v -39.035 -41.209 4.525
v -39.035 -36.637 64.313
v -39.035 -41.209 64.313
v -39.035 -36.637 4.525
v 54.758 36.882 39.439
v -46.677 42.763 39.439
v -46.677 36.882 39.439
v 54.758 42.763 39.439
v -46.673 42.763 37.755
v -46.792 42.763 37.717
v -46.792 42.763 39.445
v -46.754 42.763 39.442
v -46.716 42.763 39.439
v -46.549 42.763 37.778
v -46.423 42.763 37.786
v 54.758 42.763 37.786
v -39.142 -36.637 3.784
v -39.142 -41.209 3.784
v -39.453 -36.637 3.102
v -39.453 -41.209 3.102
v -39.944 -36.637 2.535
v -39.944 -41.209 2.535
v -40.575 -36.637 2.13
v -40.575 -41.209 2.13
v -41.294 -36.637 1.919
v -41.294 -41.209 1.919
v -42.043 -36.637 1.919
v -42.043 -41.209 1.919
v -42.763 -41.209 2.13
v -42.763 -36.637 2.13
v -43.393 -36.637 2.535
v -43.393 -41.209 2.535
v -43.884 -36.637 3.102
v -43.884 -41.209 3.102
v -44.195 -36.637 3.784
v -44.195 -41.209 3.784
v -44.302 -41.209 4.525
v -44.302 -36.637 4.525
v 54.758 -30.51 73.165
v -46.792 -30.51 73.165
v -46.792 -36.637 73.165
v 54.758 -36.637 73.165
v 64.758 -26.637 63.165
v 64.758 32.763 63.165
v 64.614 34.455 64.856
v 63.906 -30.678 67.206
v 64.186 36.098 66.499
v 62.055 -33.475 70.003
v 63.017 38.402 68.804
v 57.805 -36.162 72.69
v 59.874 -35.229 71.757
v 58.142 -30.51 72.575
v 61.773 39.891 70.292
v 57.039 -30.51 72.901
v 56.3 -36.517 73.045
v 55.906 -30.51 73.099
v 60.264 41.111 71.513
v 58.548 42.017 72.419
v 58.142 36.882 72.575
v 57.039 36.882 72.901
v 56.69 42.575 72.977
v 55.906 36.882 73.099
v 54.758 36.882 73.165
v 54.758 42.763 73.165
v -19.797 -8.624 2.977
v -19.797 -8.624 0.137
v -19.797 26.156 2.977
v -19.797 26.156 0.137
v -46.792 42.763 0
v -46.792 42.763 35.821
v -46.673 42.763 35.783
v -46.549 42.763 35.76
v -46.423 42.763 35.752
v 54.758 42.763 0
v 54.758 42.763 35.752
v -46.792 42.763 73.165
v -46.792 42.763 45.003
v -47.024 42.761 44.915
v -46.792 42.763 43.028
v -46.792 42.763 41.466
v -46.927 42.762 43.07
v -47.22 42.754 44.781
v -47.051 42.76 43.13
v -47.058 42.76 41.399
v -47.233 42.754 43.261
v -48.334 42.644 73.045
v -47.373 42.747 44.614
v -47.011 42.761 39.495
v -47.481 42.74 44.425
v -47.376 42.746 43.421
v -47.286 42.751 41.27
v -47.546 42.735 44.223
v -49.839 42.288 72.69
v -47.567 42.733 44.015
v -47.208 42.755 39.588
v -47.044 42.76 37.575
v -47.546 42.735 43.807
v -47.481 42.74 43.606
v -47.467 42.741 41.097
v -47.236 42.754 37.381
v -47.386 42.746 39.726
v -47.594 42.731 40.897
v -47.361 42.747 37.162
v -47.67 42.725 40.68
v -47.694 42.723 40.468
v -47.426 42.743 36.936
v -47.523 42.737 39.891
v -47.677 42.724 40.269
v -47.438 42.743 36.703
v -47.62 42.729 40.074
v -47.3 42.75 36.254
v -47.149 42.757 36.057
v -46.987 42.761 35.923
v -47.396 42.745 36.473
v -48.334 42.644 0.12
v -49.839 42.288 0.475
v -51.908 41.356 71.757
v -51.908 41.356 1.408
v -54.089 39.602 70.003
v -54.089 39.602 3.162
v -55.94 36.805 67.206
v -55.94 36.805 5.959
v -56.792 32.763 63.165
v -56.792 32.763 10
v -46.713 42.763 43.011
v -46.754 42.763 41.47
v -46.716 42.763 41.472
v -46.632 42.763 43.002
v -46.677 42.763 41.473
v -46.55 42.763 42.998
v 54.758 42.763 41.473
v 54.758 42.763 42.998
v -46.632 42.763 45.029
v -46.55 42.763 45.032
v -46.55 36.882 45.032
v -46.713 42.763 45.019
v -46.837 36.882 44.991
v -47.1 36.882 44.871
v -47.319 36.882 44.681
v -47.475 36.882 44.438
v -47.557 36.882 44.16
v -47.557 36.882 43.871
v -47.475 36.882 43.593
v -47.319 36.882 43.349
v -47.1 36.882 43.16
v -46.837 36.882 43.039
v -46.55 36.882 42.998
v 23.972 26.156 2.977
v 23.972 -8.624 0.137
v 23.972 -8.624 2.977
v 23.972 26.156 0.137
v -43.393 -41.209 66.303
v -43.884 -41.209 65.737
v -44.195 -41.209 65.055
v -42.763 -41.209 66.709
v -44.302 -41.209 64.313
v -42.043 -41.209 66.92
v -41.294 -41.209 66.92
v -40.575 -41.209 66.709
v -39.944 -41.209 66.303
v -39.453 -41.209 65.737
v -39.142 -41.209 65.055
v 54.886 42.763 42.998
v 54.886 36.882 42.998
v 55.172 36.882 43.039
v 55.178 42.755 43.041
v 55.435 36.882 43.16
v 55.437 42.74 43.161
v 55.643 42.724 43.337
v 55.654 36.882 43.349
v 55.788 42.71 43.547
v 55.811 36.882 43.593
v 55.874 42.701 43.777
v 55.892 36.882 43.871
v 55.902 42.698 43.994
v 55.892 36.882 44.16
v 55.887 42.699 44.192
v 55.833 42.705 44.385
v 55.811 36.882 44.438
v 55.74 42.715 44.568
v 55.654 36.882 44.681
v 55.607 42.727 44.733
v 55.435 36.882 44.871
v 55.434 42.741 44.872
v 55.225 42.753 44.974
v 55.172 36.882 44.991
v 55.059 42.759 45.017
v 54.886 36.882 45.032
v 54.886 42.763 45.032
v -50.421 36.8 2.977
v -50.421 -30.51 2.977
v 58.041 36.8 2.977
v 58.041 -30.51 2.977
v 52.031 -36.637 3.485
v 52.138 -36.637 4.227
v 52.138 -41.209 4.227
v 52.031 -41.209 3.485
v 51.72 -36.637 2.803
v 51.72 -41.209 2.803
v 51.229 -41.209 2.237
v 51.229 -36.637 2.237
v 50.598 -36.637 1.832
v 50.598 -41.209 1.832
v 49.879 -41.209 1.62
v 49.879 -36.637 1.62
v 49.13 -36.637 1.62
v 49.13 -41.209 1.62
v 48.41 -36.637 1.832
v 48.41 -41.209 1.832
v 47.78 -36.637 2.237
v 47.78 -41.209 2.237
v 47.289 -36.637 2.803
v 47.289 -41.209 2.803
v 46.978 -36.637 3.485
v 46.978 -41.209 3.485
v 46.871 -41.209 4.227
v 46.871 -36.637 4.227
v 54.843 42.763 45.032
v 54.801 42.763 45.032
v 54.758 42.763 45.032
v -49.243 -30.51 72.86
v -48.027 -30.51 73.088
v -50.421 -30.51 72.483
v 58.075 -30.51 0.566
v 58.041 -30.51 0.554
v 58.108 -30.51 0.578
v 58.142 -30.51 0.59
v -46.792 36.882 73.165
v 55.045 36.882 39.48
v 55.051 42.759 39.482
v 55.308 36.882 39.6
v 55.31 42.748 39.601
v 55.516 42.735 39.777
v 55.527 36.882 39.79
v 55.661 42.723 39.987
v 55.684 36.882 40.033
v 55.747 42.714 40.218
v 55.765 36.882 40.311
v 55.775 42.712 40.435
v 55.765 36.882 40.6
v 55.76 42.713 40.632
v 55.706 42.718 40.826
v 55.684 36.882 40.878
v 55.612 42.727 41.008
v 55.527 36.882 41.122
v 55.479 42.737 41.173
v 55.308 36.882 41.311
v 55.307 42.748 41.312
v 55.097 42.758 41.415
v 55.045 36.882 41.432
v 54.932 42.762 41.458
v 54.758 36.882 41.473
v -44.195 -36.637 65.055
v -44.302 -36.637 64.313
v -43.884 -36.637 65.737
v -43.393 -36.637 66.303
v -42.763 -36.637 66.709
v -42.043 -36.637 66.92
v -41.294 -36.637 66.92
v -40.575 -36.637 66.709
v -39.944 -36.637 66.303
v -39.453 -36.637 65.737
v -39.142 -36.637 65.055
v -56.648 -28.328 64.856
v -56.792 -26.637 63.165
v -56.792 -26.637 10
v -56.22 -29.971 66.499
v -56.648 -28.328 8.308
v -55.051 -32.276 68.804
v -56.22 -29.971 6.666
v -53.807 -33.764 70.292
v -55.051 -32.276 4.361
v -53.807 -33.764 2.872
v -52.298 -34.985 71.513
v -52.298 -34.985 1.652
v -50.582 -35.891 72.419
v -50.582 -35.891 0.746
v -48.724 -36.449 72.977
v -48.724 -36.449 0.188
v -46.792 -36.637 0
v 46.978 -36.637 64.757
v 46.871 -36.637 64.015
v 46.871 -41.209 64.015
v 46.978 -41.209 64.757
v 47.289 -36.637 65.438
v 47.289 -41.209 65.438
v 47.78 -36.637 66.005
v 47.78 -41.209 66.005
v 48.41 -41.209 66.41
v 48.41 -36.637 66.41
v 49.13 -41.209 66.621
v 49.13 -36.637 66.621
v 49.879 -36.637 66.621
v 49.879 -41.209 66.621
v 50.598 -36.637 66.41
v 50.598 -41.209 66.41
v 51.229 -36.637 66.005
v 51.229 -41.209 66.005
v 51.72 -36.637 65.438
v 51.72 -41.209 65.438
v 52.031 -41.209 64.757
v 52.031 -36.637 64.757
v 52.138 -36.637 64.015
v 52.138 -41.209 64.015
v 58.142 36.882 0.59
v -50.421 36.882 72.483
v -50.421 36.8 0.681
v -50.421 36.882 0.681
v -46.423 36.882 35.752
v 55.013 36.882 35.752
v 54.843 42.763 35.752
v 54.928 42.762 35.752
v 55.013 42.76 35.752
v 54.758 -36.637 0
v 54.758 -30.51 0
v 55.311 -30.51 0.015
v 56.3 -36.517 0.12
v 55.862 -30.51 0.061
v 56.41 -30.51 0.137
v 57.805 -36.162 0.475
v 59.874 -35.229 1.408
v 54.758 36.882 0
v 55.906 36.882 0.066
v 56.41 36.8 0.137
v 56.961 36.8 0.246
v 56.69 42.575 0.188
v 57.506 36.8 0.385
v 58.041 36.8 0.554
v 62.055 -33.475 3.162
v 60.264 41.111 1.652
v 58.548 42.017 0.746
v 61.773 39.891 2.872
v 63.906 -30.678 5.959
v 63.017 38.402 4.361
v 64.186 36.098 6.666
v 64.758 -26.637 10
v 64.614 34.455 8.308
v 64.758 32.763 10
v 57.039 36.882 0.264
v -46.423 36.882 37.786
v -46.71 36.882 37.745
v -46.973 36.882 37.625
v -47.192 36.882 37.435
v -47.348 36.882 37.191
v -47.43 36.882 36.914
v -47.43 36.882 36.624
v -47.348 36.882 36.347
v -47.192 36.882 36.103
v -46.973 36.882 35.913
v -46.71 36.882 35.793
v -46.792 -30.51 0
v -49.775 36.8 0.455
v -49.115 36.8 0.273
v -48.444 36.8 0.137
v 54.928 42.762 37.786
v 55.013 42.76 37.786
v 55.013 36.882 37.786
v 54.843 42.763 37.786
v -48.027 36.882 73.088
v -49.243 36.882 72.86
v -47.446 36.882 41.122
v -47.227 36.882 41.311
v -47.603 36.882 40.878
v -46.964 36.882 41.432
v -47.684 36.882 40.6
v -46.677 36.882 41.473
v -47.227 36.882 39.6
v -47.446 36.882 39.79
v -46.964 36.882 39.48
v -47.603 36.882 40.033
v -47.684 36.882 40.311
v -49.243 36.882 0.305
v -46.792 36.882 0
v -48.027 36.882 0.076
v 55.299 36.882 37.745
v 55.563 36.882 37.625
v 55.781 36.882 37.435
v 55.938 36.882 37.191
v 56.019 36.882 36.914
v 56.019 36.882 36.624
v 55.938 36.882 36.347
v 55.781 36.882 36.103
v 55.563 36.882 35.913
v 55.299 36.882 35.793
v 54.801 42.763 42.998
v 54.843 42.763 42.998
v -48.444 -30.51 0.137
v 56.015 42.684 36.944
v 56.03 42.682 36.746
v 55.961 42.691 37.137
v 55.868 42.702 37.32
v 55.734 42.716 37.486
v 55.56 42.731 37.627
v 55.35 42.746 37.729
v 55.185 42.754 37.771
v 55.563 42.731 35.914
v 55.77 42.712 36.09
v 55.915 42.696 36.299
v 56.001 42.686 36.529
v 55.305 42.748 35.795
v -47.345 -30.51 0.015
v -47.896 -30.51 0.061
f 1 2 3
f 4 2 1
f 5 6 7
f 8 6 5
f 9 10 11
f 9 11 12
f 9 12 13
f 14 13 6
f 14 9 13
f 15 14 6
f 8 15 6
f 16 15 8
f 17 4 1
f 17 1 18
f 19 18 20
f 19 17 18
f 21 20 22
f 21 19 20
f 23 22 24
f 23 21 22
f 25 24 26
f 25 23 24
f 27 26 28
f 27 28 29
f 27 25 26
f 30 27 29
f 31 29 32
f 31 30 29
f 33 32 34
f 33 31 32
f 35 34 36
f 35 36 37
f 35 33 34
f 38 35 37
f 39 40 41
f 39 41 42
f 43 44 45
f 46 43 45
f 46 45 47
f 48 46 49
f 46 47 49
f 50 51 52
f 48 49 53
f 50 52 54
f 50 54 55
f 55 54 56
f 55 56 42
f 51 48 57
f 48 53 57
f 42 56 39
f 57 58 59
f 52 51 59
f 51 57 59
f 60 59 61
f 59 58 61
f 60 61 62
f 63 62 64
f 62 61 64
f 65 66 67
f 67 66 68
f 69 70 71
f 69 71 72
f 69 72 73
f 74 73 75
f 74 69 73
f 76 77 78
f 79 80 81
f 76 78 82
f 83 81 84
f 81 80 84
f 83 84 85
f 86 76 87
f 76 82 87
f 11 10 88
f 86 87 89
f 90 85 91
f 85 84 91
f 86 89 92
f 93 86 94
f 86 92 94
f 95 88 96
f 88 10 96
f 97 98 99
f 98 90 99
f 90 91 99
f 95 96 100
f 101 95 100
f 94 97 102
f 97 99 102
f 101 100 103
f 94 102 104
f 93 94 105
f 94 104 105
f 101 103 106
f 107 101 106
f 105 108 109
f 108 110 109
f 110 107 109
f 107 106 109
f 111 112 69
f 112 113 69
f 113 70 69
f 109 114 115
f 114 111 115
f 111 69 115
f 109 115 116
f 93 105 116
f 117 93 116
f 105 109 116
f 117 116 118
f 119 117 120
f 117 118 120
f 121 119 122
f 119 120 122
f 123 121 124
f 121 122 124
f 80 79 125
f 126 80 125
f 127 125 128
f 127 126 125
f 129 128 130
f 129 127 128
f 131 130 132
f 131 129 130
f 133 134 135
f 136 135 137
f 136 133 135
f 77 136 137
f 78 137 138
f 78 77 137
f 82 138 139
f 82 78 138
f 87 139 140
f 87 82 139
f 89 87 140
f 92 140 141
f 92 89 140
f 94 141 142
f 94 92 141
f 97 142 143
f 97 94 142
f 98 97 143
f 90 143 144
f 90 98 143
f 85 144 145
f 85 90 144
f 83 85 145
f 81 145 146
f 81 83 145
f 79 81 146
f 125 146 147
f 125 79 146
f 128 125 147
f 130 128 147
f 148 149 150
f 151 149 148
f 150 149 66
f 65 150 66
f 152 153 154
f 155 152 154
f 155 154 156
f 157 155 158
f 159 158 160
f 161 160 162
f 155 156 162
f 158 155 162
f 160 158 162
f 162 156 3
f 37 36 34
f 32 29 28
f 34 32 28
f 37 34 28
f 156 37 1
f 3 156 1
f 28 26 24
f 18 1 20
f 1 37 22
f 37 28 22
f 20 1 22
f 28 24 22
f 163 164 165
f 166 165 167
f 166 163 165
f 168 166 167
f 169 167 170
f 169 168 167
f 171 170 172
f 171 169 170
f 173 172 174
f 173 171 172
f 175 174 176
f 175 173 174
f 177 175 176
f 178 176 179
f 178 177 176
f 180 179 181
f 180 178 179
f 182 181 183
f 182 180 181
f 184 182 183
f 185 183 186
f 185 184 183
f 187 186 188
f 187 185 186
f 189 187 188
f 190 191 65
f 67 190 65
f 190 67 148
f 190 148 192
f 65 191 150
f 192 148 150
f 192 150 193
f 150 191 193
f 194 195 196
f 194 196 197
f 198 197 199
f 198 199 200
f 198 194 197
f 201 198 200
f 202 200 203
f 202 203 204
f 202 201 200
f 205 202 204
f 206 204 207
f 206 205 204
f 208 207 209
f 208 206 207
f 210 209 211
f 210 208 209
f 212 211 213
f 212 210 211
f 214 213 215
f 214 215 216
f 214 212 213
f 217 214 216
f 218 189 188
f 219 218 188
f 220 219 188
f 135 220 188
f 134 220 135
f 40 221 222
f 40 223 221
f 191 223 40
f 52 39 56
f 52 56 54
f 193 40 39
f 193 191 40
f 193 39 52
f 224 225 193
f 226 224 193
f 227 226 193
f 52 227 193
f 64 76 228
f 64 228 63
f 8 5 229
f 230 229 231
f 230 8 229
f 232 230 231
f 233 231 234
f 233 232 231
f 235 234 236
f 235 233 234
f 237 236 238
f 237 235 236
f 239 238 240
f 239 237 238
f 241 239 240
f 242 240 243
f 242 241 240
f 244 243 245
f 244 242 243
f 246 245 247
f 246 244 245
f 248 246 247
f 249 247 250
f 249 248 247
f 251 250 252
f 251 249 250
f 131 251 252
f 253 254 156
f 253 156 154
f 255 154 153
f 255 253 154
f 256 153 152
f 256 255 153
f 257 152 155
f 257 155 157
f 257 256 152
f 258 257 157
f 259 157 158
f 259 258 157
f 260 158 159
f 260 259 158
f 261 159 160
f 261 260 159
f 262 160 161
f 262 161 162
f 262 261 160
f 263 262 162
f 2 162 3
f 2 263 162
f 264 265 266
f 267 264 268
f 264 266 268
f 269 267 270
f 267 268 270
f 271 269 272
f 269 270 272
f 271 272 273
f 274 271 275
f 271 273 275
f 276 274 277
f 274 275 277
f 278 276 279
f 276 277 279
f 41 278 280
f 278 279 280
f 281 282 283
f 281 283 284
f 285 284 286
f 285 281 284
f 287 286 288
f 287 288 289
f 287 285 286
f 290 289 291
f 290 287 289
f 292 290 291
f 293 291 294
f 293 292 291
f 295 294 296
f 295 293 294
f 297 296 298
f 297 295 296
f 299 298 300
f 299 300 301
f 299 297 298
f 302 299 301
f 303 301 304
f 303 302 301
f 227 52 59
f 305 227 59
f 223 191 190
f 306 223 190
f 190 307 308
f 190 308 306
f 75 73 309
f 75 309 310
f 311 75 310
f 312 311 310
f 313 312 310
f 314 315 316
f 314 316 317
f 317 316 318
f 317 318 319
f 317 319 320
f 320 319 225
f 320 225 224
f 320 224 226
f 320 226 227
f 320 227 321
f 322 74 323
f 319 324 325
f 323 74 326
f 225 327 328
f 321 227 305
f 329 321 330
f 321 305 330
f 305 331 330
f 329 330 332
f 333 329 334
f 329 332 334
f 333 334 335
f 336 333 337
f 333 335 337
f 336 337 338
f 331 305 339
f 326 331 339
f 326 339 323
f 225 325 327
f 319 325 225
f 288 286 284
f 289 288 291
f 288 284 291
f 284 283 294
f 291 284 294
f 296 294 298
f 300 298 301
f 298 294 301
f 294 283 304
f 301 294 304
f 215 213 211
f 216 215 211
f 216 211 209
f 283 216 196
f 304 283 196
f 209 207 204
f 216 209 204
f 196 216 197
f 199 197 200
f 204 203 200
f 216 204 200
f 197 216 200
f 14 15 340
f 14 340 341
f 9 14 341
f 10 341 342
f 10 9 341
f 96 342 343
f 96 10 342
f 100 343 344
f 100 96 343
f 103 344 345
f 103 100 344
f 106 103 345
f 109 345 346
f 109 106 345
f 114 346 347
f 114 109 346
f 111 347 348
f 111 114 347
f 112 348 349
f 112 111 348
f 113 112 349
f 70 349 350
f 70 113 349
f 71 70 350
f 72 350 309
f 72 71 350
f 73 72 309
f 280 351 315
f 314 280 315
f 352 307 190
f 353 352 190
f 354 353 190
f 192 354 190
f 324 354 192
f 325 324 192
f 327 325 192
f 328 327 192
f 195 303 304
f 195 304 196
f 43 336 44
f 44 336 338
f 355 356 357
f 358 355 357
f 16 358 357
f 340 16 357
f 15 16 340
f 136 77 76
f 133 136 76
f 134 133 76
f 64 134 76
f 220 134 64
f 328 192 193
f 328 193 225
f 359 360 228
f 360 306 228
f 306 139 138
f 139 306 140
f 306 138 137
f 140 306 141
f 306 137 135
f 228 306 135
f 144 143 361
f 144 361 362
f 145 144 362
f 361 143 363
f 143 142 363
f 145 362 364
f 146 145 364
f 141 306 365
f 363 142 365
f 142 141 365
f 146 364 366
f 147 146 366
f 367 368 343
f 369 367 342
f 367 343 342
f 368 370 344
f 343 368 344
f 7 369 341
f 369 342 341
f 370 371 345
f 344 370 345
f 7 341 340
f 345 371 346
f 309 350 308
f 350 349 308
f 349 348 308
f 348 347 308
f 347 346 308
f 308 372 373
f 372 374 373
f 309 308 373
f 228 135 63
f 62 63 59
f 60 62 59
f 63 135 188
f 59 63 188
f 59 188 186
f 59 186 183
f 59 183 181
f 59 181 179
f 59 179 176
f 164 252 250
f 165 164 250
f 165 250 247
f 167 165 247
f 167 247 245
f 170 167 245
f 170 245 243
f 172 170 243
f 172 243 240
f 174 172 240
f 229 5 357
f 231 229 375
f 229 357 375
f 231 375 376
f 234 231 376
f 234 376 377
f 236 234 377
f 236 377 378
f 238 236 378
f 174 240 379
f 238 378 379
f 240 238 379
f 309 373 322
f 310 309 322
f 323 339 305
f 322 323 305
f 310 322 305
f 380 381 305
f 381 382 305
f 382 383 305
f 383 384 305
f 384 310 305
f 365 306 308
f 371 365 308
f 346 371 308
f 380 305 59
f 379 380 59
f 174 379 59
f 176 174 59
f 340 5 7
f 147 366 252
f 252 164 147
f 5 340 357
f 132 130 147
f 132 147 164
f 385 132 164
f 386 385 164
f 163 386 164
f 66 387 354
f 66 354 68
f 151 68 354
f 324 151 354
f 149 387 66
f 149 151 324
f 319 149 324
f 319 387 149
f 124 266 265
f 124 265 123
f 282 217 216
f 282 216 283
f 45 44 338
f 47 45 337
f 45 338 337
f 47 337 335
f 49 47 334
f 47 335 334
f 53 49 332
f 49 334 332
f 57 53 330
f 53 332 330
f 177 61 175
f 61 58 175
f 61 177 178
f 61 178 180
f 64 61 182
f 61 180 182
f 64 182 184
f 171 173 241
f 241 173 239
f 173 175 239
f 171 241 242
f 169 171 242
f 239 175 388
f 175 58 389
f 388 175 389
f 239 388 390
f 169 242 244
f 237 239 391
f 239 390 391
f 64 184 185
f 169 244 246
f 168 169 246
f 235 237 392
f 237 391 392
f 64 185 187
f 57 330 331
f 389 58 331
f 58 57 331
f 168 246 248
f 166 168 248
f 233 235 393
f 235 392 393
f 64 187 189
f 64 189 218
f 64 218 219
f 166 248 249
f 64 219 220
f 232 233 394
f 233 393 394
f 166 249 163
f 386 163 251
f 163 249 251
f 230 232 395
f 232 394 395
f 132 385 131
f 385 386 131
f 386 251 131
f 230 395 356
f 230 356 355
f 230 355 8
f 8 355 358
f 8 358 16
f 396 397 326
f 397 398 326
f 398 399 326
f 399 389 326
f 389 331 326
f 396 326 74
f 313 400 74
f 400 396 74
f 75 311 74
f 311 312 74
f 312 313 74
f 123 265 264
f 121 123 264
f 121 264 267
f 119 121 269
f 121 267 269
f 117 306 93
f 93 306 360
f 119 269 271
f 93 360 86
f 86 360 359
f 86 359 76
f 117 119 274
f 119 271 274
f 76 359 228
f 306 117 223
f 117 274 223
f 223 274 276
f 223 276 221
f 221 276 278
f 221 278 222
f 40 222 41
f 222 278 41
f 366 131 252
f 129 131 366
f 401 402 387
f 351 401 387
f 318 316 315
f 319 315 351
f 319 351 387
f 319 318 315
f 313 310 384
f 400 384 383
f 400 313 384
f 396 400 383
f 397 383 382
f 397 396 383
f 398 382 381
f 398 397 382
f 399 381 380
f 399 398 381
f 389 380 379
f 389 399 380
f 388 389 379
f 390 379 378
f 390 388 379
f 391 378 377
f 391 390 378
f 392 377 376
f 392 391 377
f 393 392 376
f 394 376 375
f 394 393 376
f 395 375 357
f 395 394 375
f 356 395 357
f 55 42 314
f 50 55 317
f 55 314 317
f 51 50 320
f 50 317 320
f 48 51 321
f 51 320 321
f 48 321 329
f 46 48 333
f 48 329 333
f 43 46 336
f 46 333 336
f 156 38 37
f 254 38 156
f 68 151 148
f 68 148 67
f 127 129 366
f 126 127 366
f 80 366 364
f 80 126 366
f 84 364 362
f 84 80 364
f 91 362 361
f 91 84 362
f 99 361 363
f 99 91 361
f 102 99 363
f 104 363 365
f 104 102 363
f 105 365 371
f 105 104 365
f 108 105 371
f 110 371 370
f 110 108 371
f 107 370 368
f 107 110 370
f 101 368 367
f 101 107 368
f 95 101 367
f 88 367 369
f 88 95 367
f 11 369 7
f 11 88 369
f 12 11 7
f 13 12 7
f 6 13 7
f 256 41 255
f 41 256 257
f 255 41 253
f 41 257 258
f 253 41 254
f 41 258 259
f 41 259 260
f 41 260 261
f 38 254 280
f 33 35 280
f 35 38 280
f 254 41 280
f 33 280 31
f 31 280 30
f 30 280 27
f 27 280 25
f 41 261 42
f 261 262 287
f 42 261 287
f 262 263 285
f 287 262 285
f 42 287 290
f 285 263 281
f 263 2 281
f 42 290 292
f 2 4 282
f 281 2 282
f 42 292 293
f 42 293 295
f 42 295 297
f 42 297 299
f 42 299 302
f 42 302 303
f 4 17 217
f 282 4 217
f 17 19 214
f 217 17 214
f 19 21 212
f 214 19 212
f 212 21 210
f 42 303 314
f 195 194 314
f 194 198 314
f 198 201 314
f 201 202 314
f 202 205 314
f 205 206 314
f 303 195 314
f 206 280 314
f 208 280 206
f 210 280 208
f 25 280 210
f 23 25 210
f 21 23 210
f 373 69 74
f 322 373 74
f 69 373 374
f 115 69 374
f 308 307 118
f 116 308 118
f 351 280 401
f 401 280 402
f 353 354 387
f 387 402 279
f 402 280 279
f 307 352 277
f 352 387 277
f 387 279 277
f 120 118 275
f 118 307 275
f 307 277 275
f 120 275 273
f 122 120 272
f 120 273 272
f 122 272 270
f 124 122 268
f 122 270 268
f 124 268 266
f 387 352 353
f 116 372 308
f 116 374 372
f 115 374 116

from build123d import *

# Parameters (mm, degrees)
IZIM1_W                     = 121.550964813
IZIM1_H                     = 79.400227015
IZIM1_W_2                   = 108.562656073
IZIM1_H_2                   = 67.392167991
Y_KSEKLIK_EKSTR_ZYON1_DEPTH = 73.164910278
IZIM2_W                     = 108.665778405
IZIM2_H                     = 2.839609685
Y_KSEKLIK_EKSTR_ZYON3_DEPTH = 67.31
IZIM4_W                     = 43.769026383
IZIM4_H                     = 34.779664875
KES_EKSTR_ZYON3_DEPTH       = 51.308
RADYUS1_R                   = 10
RADYUS2_R                   = 10
KES_EKSTR_ZYON6_DEPTH       = 25.4
Y_KSEKLIK_EKSTR_ZYON4_DEPTH = 4.572


with BuildPart() as part:
    # Çizim1 → Yükseklik-Ekstrüzyon1 (new body)
    with BuildSketch(Plane.XY):
        with Locations((3.983010787, 3.063280364)):
            Rectangle(IZIM1_W, IZIM1_H)
        with Locations((3.860479571, 3.185811577)):
            Rectangle(IZIM1_W_2, IZIM1_H_2, mode=Mode.SUBTRACT)
    extrude(amount=Y_KSEKLIK_EKSTR_ZYON1_DEPTH)

    # Çizim2 → Yükseklik-Ekstrüzyon3 (add)
    with BuildSketch(Plane(origin=(0, -30.510272418, 0), x_dir=(1, 0, 0), z_dir=(0, 1, 0))):
        with Locations((3.70835341, -1.557090266)):
            Rectangle(IZIM2_W, IZIM2_H)
    extrude(amount=Y_KSEKLIK_EKSTR_ZYON3_DEPTH)

    # Çizim4 → Kes-Ekstrüzyon3 (cut)
    with BuildSketch(Plane(origin=(0, 0, 0.137285424), x_dir=(-1, 0, 0), z_dir=(0, 0, -1))):
        with Locations((-2.08713858, 8.765719608)):
            Rectangle(IZIM4_W, IZIM4_H)
    extrude(amount=-KES_EKSTR_ZYON3_DEPTH, mode=Mode.SUBTRACT)

    # Radyus1
    # the kernel refuses this fillet: 10 mm, written as the material it takes off along each edge
    with BuildSketch(Plane(origin=(64.758493193, -36.636833144, -25), x_dir=(0, 1, 0), z_dir=(0, 0, 1)), Plane(origin=(64.758493193, 42.763393871, -25), x_dir=(-1, 0, 0), z_dir=(0, 0, 1))) as radyus1_piece_1:
        with BuildLine():
            CenterArc((RADYUS1_R, RADYUS1_R), RADYUS1_R, 180, 90)
            Line((0, RADYUS1_R), (0, 0))
            Line((0, 0), (RADYUS1_R, 0))
        make_face()
    extrude(amount=123.164910278, mode=Mode.SUBTRACT)
    with BuildSketch(Plane(origin=(64.758493193, 67.763393871, 73.164910278), x_dir=(0, 0, -1), z_dir=(0, -1, 0))) as radyus1_piece_2:
        with BuildLine():
            CenterArc((RADYUS1_R, -RADYUS1_R), RADYUS1_R, 90, 90)
            Line((0, -RADYUS1_R), (0, 0))
            Line((0, 0), (RADYUS1_R, 0))
        make_face()
    extrude(amount=129.400227015, mode=Mode.SUBTRACT)
    with BuildSketch(Plane(origin=(64.758493193, 67.763393871, 0), x_dir=(0, 0, 1), z_dir=(0, -1, 0))) as radyus1_piece_3:
        with BuildLine():
            CenterArc((RADYUS1_R, RADYUS1_R), RADYUS1_R, 180, 90)
            Line((0, RADYUS1_R), (0, 0))
            Line((0, 0), (RADYUS1_R, 0))
        make_face()
    extrude(amount=129.400227015, mode=Mode.SUBTRACT)

    # Radyus2
    # the kernel refuses this fillet: 10 mm, written as the material it takes off along each edge
    with BuildSketch(Plane(origin=(-56.79247162, 42.763393871, -25), x_dir=(1, 0, 0), z_dir=(0, 0, 1)), Plane(origin=(-56.79247162, -36.636833144, -25), x_dir=(0, 1, 0), z_dir=(0, 0, 1))) as radyus2_piece_1:
        with BuildLine():
            CenterArc((RADYUS2_R, -RADYUS2_R), RADYUS2_R, 90, 90)
            Line((0, -RADYUS2_R), (0, 0))
            Line((0, 0), (RADYUS2_R, 0))
        make_face()
    extrude(amount=123.164910278, mode=Mode.SUBTRACT)
    with BuildSketch(Plane(origin=(-56.79247162, -61.636833144, 73.164910278), x_dir=(1, 0, 0), z_dir=(0, 1, 0))) as radyus2_piece_2:
        with BuildLine():
            CenterArc((RADYUS2_R, RADYUS2_R), RADYUS2_R, 180, 90)
            Line((0, RADYUS2_R), (0, 0))
            Line((0, 0), (RADYUS2_R, 0))
        make_face()
    extrude(amount=129.400227015, mode=Mode.SUBTRACT)
    with BuildSketch(Plane(origin=(-56.79247162, -61.636833144, 0), x_dir=(1, 0, 0), z_dir=(0, 1, 0))) as radyus2_piece_3:
        with BuildLine():
            CenterArc((RADYUS2_R, -RADYUS2_R), RADYUS2_R, 90, 90)
            Line((0, -RADYUS2_R), (0, 0))
            Line((0, 0), (RADYUS2_R, 0))
        make_face()
    extrude(amount=129.400227015, mode=Mode.SUBTRACT)

    # Çizim5 → Kes-Ekstrüzyon6 (cut)
    with BuildSketch(Plane(origin=(0, 42.763393871, 0), x_dir=(1, 0, 0), z_dir=(0, 1, 0))):
        with BuildLine():
            Line((-46.423230595, -35.751971692), (55.012749139, -35.751971692))
            ThreePointArc((55.012749139, -35.751971692), (56.029772925, -36.768995478), (55.012749139, -37.786019263))
            Line((55.012749139, -37.786019263), (-46.423230595, -37.786019263))
            ThreePointArc((-46.423230595, -37.786019263), (-47.44025438, -36.768995478), (-46.423230595, -35.751971692))
        make_face()
        with BuildLine():
            Line((-46.550358568, -42.998266165), (54.885621166, -42.998266165))
            ThreePointArc((54.885621166, -42.998266165), (55.902644952, -44.015289951), (54.885621166, -45.032313737))
            Line((54.885621166, -45.032313737), (-46.550358568, -45.032313737))
            ThreePointArc((-46.550358568, -45.032313737), (-47.567382354, -44.015289951), (-46.550358568, -42.998266165))
        make_face()
        with BuildLine():
            Line((-46.677486541, -39.438682915), (54.758493193, -39.438682915))
            ThreePointArc((54.758493193, -39.438682915), (55.775516978, -40.455706701), (54.758493193, -41.472730487))
            Line((54.758493193, -41.472730487), (-46.677486541, -41.472730487))
            ThreePointArc((-46.677486541, -41.472730487), (-47.694510327, -40.455706701), (-46.677486541, -39.438682915))
        make_face()
    extrude(amount=-KES_EKSTR_ZYON6_DEPTH, mode=Mode.SUBTRACT)

    # Çizim6 → Yükseklik-Ekstrüzyon4 (add)
    with BuildSketch(Plane(origin=(0, -36.636833144, 0), x_dir=(-1, 0, 0), z_dir=(0, -1, 0))):
        with BuildLine():
            Line((-46.87100271, -4.227005014), (-46.87100271, -64.014742354))
            ThreePointArc((-46.87100271, -64.014742354), (-49.504404567, -66.64814421), (-52.137806423, -64.014742354))
            Line((-52.137806423, -64.014742354), (-52.137806423, -4.227005014))
            ThreePointArc((-52.137806423, -4.227005014), (-49.504404567, -1.593603158), (-46.87100271, -4.227005014))
        make_face()
        with BuildLine():
            Line((44.301980946, -4.525434052), (44.301980946, -64.313171393))
            ThreePointArc((44.301980946, -64.313171393), (41.66857909, -66.946573249), (39.035177234, -64.313171393))
            Line((39.035177234, -64.313171393), (39.035177234, -4.525434052))
            ThreePointArc((39.035177234, -4.525434052), (41.66857909, -1.892032196), (44.301980946, -4.525434052))
        make_face()
    extrude(amount=Y_KSEKLIK_EKSTR_ZYON4_DEPTH)


solid = part.part
